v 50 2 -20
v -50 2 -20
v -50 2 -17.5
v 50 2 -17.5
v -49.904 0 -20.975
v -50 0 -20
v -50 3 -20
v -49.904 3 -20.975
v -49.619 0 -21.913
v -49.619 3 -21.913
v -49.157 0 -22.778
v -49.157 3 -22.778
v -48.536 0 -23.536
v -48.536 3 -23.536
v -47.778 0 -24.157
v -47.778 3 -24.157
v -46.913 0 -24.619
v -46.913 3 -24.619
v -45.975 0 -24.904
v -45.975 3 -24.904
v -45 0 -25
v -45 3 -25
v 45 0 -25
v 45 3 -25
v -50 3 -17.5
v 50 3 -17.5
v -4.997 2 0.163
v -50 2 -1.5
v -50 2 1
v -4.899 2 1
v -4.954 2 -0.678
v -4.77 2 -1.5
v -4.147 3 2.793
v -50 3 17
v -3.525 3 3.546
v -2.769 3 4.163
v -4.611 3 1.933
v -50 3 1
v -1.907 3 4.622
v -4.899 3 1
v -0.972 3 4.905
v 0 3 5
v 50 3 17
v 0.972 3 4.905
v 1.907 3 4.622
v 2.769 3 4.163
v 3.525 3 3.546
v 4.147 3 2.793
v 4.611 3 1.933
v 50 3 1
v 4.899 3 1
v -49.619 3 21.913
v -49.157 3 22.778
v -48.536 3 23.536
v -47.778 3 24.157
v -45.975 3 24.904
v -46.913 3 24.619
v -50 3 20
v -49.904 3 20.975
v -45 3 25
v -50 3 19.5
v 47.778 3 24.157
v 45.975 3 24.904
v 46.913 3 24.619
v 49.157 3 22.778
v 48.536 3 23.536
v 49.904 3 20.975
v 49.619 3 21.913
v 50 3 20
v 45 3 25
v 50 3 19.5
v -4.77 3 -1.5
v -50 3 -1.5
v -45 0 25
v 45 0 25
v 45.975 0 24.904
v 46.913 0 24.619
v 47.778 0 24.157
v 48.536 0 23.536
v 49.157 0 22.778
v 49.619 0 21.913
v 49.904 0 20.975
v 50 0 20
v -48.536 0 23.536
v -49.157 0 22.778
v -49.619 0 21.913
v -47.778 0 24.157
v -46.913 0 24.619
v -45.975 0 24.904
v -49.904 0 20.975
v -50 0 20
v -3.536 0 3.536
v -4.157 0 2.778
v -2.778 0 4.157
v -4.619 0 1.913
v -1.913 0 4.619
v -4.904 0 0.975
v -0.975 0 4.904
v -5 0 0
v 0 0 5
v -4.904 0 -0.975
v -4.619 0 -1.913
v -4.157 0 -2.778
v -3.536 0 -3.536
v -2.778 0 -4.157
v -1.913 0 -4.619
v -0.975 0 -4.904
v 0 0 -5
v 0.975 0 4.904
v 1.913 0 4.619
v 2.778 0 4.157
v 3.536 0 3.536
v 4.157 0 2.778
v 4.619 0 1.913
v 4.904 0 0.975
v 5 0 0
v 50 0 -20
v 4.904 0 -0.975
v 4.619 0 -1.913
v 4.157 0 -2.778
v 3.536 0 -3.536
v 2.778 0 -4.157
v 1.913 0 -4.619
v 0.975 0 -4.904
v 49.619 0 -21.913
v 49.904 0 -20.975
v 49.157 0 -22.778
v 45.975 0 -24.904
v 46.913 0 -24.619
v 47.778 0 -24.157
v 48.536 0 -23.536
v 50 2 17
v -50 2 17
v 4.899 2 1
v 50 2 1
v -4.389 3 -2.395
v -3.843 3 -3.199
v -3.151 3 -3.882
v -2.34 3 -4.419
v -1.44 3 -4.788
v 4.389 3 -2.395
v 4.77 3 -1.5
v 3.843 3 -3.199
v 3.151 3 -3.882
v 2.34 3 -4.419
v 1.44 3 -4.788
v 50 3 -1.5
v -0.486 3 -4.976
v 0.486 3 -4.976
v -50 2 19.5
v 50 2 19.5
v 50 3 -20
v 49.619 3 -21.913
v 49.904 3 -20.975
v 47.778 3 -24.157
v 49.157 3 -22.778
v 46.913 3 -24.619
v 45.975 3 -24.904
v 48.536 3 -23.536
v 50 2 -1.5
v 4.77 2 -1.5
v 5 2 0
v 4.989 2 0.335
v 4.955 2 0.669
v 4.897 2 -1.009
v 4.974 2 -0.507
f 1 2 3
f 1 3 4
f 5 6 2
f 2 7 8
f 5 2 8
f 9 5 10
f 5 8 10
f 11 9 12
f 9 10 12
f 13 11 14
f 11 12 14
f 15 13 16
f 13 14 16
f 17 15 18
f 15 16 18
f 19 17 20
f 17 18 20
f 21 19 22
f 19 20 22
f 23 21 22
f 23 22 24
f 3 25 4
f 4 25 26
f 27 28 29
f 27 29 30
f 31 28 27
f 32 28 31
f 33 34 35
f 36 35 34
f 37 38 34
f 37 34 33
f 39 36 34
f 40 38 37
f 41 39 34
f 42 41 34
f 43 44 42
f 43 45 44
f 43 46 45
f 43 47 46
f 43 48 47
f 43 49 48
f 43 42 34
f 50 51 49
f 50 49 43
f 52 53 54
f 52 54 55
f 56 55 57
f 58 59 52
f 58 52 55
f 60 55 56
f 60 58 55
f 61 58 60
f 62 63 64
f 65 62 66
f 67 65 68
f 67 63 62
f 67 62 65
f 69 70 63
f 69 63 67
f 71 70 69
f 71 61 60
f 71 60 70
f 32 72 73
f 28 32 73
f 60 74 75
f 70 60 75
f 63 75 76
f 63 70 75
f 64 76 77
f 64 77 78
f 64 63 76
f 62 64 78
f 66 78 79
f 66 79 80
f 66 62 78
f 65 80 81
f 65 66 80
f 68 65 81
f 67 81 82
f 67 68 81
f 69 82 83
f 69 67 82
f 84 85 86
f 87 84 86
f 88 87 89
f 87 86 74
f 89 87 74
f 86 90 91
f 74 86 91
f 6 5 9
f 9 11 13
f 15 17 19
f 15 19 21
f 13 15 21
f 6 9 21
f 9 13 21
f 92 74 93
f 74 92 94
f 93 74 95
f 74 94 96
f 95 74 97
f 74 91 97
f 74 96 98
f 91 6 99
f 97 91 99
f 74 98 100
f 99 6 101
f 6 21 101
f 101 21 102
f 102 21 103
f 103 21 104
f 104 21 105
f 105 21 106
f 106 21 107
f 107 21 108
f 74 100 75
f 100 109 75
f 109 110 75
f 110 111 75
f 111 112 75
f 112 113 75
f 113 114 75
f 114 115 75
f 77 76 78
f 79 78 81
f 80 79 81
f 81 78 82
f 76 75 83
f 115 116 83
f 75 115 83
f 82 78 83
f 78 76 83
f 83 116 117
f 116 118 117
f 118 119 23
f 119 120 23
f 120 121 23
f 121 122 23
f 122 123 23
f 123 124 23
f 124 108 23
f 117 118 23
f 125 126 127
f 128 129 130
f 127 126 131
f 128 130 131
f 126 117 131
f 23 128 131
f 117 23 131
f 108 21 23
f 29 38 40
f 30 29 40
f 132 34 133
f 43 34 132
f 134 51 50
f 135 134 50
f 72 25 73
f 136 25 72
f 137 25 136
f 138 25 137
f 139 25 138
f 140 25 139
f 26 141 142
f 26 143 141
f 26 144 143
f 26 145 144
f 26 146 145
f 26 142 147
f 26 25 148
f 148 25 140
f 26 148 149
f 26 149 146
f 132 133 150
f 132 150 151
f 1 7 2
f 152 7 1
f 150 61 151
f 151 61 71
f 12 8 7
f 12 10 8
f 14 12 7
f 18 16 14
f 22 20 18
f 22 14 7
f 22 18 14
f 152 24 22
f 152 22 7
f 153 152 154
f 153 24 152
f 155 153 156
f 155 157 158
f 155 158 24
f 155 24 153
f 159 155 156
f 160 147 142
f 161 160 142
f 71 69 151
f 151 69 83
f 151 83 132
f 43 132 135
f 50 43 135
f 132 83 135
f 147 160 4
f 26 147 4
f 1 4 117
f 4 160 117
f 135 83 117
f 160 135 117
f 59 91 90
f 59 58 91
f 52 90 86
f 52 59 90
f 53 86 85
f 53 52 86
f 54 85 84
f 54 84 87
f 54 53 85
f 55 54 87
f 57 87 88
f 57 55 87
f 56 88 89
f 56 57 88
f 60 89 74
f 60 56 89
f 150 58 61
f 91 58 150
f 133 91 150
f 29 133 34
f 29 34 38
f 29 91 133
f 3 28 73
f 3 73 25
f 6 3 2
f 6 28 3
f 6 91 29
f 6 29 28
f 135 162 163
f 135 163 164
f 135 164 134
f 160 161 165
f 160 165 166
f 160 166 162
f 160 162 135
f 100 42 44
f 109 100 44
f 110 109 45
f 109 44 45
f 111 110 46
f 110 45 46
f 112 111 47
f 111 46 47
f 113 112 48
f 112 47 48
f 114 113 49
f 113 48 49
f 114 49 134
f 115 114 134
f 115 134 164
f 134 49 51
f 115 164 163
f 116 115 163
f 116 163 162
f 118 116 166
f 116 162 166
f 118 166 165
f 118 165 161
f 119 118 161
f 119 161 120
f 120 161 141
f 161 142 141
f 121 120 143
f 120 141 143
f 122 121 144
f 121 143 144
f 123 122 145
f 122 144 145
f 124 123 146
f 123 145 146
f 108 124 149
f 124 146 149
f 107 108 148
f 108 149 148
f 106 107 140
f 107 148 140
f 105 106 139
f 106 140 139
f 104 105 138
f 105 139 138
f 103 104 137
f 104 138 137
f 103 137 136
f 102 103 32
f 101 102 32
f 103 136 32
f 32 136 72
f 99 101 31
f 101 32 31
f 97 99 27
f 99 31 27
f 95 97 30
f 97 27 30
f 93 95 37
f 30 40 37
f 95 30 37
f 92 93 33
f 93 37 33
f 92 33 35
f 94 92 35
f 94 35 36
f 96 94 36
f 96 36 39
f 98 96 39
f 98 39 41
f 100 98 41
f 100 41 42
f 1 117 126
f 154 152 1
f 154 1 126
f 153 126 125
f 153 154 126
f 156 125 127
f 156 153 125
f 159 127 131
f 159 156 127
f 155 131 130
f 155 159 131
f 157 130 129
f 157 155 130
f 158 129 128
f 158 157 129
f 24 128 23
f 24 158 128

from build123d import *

# Parameters (mm, degrees)
SKETCH1_W           = 100
SKETCH1_H           = 50
BOSS_EXTRUDE1_DEPTH = 3
FILLET1_R           = 5
SKETCH2_R           = 5
CUT_EXTRUDE1_DEPTH  = 3
SKETCH4_W           = 100
SKETCH4_H           = 2.5
CUT_EXTRUDE2_DEPTH  = 1


with BuildPart() as part:
    # Sketch1 → Boss-Extrude1 (new body)
    with BuildSketch(Plane(origin=(0, 0, 0), x_dir=(1, 0, 0), z_dir=(0, 1, 0))):
        Rectangle(SKETCH1_W, SKETCH1_H)
    extrude(amount=BOSS_EXTRUDE1_DEPTH)

    # Fillet1
    fillet1_edges = [part.edges().sort_by_distance(p)[0] for p in [
        (-50, 1.5, -25),
        (50, 1.5, -25),
        (50, 1.5, 25),
        (-50, 1.5, 25),
    ]]
    fillet(fillet1_edges, radius=FILLET1_R)

    # Sketch2 → Cut-Extrude1 (cut)
    with BuildSketch(Plane(origin=(0, 3, 0), x_dir=(1, 0, 0), z_dir=(0, 1, 0))):
        with Locations(Location((0, 0, 0), (0, 0, 270))):
            Circle(SKETCH2_R)
    extrude(amount=-CUT_EXTRUDE1_DEPTH, mode=Mode.SUBTRACT)

    # Sketch4 → Cut-Extrude2 (cut)
    with BuildSketch(Plane(origin=(0, 3, 0), x_dir=(1, 0, 0), z_dir=(0, 1, 0))):
        with Locations((0, 18.75)):
            Rectangle(SKETCH4_W, SKETCH4_H)
        with BuildLine():
            Line((-4.769696007, 1.5), (-50, 1.5))
            Line((-50, 1.5), (-50, -1))
            Line((-50, -1), (-4.898979486, -1))
            ThreePointArc((-4.898979486, -1), (-4.993327693, 0.258221909), (-4.769696007, 1.5))
        make_face()
        with BuildLine():
            Line((50, -1), (50, 1.5))
            Line((50, 1.5), (4.769696007, 1.5))
            ThreePointArc((4.769696007, 1.5), (4.942088629, 0.758788496), (5, 0))
            ThreePointArc((5, 0), (4.974680765, -0.50254481), (4.898979486, -1))
            Line((4.898979486, -1), (50, -1))
        make_face()
        with Locations((0, -18.25)):
            Rectangle(SKETCH4_W, SKETCH4_H)
    extrude(amount=-CUT_EXTRUDE2_DEPTH, mode=Mode.SUBTRACT)


solid = part.part
